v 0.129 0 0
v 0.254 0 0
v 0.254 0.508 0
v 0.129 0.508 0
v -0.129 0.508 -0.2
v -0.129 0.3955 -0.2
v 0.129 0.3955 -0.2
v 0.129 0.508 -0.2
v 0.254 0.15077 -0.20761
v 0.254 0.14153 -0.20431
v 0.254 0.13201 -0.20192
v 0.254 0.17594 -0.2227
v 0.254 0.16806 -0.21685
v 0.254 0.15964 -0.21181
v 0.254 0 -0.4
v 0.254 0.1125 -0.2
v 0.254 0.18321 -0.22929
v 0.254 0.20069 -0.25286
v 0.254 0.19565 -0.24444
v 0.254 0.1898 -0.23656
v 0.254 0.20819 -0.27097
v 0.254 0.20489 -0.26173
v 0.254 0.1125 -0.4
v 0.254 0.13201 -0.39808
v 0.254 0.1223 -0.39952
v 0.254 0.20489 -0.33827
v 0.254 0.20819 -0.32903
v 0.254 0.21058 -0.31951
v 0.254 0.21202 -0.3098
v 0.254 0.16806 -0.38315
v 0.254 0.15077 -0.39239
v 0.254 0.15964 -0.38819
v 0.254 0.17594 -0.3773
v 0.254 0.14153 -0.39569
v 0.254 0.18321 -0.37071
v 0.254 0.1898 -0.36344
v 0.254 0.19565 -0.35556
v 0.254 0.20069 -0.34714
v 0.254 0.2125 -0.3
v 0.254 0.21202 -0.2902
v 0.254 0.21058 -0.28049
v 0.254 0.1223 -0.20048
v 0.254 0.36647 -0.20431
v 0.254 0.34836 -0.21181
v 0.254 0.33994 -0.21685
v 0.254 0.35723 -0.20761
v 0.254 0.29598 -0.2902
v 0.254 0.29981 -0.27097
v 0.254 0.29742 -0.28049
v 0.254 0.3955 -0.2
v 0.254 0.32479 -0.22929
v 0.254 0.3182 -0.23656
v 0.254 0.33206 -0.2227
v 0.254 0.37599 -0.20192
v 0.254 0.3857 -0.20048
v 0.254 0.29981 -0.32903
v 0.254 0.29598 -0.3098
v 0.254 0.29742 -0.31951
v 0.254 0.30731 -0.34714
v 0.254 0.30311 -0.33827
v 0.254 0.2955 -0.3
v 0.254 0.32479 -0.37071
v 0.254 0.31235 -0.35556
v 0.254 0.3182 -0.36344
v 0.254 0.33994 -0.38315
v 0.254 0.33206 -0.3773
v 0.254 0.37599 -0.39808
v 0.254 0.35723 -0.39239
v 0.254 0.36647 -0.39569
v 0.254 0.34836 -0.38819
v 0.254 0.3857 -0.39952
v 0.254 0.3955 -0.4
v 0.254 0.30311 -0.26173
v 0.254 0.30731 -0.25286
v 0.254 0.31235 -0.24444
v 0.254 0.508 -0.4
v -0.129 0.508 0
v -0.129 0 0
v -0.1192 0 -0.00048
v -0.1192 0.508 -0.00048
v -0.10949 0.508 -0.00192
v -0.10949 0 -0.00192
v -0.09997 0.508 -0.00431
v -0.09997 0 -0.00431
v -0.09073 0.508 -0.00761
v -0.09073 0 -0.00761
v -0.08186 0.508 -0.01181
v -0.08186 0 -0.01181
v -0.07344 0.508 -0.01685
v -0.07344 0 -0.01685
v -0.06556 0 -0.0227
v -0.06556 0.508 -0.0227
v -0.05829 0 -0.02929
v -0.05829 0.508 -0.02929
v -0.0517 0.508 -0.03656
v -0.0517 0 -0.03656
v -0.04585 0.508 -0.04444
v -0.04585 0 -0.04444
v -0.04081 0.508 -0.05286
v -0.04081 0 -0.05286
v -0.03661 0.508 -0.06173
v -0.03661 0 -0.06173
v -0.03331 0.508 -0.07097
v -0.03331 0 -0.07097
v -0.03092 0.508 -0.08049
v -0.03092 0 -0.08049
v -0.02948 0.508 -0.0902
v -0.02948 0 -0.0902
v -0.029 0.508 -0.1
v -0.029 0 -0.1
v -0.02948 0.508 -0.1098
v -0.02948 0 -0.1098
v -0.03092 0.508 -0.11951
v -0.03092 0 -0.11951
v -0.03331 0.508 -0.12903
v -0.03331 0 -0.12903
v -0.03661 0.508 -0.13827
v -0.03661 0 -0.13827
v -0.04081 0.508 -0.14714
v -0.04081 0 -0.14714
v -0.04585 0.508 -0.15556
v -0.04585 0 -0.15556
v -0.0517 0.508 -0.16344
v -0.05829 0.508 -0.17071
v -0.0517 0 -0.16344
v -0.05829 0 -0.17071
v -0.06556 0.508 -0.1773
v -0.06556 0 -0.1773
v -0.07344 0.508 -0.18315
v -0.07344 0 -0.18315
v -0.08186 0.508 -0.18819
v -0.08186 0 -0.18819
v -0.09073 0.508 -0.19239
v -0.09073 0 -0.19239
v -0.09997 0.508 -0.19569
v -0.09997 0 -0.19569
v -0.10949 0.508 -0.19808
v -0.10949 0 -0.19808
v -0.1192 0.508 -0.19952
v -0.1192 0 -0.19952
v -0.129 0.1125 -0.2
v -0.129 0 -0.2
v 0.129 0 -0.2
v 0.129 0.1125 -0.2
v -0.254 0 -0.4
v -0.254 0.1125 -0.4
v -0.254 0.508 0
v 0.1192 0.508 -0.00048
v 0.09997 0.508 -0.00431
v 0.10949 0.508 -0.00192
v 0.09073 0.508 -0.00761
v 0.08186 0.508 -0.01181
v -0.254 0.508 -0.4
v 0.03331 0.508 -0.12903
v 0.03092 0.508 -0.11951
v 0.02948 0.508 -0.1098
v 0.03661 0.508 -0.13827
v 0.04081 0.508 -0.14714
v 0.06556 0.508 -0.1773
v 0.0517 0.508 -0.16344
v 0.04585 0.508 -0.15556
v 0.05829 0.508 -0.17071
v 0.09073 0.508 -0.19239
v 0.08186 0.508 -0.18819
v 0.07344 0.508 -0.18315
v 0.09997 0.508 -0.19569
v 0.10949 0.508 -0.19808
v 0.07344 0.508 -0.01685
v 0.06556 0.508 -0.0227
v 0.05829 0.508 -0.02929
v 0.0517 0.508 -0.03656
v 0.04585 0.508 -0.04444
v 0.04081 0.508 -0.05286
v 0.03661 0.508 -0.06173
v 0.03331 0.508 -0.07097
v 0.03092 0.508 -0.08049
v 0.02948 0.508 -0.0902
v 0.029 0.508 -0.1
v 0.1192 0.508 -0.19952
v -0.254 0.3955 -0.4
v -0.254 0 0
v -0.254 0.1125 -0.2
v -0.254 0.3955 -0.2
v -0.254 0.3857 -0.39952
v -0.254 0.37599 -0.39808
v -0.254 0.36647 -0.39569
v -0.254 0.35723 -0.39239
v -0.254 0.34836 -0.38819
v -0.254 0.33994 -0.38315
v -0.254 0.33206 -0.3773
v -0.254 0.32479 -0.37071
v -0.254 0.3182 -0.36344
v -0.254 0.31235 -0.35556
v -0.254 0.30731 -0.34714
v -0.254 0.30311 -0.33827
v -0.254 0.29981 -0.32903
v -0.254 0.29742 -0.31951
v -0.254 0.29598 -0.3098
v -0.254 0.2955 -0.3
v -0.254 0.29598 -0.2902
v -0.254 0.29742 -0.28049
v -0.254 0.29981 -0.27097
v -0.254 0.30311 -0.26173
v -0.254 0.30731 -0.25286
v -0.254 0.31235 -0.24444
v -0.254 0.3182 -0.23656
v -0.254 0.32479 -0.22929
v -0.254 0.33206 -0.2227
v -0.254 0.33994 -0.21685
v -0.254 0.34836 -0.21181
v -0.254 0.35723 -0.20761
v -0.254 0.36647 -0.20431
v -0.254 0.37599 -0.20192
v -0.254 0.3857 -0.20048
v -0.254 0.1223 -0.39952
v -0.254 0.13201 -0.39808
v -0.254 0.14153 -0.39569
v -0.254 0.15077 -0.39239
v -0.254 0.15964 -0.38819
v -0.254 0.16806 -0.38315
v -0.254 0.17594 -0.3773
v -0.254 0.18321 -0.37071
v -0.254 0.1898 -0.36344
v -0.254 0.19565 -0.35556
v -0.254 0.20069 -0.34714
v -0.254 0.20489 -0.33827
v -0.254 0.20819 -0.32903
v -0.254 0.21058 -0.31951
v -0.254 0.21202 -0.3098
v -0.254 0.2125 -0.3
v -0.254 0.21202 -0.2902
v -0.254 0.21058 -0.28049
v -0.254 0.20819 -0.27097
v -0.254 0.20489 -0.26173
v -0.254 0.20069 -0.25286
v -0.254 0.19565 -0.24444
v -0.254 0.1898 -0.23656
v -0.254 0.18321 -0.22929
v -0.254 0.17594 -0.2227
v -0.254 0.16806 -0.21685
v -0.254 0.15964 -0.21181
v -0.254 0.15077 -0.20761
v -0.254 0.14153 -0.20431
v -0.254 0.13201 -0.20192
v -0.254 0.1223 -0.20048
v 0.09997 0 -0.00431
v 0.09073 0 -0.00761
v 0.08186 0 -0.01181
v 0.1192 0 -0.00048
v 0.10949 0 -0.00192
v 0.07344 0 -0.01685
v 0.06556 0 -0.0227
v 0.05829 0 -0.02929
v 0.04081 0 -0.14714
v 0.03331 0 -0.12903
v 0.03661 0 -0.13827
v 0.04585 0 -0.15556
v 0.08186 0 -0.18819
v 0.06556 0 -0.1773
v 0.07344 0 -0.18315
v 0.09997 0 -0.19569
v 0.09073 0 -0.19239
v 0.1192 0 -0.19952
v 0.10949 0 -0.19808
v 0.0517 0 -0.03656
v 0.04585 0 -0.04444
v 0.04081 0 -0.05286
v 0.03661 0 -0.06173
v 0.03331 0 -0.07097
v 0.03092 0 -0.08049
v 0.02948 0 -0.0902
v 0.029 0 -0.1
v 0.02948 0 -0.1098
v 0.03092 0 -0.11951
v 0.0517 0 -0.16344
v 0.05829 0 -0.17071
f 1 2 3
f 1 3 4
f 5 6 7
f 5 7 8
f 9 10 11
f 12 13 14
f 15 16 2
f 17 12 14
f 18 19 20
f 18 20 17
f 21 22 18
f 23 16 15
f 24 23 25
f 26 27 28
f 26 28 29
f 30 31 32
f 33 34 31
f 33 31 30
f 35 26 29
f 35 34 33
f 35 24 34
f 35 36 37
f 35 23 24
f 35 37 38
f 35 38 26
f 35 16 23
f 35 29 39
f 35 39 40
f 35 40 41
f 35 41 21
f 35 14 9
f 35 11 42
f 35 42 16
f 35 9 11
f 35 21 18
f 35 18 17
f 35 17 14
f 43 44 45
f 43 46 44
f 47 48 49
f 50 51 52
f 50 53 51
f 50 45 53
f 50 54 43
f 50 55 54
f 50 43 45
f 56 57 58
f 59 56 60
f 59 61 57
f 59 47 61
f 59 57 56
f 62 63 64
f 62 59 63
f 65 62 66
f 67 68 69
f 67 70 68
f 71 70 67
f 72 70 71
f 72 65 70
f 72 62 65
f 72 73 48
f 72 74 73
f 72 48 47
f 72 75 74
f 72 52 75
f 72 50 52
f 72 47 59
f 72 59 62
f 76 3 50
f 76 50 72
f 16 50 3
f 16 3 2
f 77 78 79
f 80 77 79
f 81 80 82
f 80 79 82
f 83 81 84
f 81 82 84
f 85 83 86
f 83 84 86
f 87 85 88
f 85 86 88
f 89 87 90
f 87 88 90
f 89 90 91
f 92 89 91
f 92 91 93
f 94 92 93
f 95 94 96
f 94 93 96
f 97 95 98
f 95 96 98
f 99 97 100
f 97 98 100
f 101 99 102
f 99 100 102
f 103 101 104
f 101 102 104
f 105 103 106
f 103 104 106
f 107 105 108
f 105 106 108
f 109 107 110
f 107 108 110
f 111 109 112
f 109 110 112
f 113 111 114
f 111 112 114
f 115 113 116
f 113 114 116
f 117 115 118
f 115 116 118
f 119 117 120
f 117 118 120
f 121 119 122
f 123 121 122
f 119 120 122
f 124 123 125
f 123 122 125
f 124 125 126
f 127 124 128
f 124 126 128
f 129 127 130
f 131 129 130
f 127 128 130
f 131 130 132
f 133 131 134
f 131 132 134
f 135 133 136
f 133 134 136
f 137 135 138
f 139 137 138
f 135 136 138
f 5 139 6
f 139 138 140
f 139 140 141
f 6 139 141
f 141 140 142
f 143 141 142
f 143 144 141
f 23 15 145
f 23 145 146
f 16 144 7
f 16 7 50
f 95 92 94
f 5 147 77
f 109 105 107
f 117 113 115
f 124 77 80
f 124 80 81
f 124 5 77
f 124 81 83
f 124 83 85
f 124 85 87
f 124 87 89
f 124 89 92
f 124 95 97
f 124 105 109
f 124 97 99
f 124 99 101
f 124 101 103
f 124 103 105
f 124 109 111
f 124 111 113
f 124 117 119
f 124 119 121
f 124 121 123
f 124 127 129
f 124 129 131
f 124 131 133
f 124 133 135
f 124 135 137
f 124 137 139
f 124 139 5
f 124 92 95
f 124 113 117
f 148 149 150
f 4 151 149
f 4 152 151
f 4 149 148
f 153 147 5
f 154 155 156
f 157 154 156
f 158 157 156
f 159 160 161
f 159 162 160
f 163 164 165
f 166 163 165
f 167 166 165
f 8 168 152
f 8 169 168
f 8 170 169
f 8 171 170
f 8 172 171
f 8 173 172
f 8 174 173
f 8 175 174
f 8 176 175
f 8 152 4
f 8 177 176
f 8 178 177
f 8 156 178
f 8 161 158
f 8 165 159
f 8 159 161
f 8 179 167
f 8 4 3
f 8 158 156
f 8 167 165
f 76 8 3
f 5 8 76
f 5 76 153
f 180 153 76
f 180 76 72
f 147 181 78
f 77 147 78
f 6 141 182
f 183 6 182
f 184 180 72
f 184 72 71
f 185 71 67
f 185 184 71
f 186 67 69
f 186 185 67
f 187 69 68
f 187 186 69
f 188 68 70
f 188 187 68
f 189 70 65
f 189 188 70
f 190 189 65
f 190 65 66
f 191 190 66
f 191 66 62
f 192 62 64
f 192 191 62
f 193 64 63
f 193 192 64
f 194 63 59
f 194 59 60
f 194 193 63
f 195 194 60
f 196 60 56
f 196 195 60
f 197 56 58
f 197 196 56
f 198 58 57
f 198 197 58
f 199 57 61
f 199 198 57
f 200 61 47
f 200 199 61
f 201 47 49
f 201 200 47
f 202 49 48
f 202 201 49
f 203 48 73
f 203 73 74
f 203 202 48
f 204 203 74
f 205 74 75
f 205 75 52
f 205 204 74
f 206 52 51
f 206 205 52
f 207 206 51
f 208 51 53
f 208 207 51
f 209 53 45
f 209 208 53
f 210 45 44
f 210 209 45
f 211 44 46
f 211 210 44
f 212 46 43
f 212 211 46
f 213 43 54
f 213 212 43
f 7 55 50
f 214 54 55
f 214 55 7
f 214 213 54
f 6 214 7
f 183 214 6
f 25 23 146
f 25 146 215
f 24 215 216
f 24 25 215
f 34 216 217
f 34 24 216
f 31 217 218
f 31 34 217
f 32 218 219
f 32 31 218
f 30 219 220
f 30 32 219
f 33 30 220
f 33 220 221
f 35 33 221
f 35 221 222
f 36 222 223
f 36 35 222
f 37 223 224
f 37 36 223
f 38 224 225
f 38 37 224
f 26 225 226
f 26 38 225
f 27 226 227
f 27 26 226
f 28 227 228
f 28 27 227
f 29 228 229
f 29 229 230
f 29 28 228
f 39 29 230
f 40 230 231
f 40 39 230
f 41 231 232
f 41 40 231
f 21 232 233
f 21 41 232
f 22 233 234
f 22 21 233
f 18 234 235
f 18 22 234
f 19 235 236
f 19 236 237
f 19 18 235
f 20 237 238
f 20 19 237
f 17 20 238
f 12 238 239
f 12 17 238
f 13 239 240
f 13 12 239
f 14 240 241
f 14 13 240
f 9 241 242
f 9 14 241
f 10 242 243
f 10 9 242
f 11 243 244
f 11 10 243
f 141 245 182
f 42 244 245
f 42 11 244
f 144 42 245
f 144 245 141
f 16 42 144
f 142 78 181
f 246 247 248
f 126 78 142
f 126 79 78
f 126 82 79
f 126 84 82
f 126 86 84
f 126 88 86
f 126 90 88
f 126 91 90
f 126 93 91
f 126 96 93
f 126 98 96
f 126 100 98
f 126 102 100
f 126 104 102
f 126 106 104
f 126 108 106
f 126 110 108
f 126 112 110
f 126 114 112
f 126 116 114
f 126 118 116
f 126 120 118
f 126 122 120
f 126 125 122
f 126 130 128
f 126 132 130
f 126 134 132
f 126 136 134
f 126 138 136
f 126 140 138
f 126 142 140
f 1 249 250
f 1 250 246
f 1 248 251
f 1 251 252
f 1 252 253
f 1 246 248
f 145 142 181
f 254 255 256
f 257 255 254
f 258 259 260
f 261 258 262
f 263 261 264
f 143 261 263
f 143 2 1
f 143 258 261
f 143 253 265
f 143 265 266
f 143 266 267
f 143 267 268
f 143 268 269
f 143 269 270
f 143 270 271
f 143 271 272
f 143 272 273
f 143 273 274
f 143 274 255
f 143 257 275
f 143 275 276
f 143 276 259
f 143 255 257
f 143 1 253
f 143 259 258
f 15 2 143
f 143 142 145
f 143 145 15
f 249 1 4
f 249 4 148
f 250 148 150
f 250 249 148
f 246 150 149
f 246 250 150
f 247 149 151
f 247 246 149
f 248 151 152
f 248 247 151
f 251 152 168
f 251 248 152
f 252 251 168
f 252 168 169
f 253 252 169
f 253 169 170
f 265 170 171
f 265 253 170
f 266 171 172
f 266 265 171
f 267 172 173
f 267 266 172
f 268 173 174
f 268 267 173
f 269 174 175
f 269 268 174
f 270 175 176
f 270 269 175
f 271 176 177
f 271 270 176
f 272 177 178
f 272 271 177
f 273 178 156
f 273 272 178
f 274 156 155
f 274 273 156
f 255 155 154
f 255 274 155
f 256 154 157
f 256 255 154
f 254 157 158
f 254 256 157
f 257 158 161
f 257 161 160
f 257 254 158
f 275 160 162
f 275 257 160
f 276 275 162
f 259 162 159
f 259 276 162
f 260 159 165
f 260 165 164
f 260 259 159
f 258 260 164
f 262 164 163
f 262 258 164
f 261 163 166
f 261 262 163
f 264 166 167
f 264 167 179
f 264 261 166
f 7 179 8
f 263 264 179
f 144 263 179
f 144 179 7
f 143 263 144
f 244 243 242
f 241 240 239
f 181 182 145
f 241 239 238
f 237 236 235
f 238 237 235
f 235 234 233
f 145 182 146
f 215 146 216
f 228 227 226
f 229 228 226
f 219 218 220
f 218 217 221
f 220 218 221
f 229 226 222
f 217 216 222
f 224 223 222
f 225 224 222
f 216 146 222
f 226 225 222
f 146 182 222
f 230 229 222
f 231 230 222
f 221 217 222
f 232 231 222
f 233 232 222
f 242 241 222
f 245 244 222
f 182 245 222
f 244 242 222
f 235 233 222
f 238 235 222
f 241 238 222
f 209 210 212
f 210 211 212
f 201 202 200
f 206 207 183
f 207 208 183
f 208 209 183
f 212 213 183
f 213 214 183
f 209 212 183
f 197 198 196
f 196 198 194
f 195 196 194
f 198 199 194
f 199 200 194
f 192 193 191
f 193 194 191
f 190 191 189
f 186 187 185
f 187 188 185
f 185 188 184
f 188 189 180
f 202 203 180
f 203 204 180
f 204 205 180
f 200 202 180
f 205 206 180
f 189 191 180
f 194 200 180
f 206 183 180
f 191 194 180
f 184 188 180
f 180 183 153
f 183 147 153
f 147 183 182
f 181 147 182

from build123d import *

# Parameters (mm, degrees)
DODANIE_WYCI_GNI_CIE1_DEPTH   = 0.508
DODANIE_WYCI_GNI_CIE1_2_DEPTH = 0.508
DODANIE_WYCI_GNI_CIE2_DEPTH   = 0.254


with BuildPart() as part:
    # Szkic1 → Dodanie-wyciągnięcie1 (new body)
    with BuildSketch(Plane(origin=(0, 0, 0), x_dir=(1, 0, 0), z_dir=(0, 1, 0))):
        with BuildLine():
            Line((-0.254, 0), (-0.129, 0))
            ThreePointArc((-0.129, 0), (-0.029, 0.1), (-0.129, 0.2))
            Line((-0.129, 0.2), (-0.254, 0.2))
            Line((-0.254, 0.2), (-0.254, 0))
        make_face()
    extrude(amount=DODANIE_WYCI_GNI_CIE1_DEPTH)



with BuildPart() as body_2:
    # Szkic1 → Dodanie-wyci_gni_cie1 2 (new body)
    with BuildSketch(Plane(origin=(0, 0, 0), x_dir=(1, 0, 0), z_dir=(0, 1, 0))):
        with BuildLine():
            Line((0.129, 0.2), (0.254, 0.2))
            Line((0.254, 0.2), (0.254, 0))
            Line((0.254, 0), (0.129, 0))
            ThreePointArc((0.129, 0), (0.029, 0.1), (0.129, 0.2))
        make_face()
    extrude(amount=DODANIE_WYCI_GNI_CIE1_2_DEPTH)


with BuildPart() as part_1:
    add(part.part)

    add(body_2.part)  # Dodanie-wyciągnięcie2 merges body 2
    # Szkic4 → Dodanie-wyciągnięcie2 (add, symmetric)
    with BuildSketch(Plane(origin=(0, 0, 0), x_dir=(0, 0, -1), z_dir=(1, 0, 0))):
        with BuildLine():
            Line((0.2, 0.508), (0.4, 0.508))
            Line((0.4, 0.508), (0.4, 0.3955))
            ThreePointArc((0.4, 0.3955), (0.3, 0.2955), (0.2, 0.3955))
            Line((0.2, 0.3955), (0.2, 0.508))
        make_face()
        with BuildLine():
            Line((0.2, 0), (0.4, 0))
            Line((0.4, 0), (0.4, 0.1125))
            ThreePointArc((0.4, 0.1125), (0.3, 0.2125), (0.2, 0.1125))
            Line((0.2, 0.1125), (0.2, 0))
        make_face()
    extrude(amount=DODANIE_WYCI_GNI_CIE2_DEPTH, both=True)


solid = part_1.part
